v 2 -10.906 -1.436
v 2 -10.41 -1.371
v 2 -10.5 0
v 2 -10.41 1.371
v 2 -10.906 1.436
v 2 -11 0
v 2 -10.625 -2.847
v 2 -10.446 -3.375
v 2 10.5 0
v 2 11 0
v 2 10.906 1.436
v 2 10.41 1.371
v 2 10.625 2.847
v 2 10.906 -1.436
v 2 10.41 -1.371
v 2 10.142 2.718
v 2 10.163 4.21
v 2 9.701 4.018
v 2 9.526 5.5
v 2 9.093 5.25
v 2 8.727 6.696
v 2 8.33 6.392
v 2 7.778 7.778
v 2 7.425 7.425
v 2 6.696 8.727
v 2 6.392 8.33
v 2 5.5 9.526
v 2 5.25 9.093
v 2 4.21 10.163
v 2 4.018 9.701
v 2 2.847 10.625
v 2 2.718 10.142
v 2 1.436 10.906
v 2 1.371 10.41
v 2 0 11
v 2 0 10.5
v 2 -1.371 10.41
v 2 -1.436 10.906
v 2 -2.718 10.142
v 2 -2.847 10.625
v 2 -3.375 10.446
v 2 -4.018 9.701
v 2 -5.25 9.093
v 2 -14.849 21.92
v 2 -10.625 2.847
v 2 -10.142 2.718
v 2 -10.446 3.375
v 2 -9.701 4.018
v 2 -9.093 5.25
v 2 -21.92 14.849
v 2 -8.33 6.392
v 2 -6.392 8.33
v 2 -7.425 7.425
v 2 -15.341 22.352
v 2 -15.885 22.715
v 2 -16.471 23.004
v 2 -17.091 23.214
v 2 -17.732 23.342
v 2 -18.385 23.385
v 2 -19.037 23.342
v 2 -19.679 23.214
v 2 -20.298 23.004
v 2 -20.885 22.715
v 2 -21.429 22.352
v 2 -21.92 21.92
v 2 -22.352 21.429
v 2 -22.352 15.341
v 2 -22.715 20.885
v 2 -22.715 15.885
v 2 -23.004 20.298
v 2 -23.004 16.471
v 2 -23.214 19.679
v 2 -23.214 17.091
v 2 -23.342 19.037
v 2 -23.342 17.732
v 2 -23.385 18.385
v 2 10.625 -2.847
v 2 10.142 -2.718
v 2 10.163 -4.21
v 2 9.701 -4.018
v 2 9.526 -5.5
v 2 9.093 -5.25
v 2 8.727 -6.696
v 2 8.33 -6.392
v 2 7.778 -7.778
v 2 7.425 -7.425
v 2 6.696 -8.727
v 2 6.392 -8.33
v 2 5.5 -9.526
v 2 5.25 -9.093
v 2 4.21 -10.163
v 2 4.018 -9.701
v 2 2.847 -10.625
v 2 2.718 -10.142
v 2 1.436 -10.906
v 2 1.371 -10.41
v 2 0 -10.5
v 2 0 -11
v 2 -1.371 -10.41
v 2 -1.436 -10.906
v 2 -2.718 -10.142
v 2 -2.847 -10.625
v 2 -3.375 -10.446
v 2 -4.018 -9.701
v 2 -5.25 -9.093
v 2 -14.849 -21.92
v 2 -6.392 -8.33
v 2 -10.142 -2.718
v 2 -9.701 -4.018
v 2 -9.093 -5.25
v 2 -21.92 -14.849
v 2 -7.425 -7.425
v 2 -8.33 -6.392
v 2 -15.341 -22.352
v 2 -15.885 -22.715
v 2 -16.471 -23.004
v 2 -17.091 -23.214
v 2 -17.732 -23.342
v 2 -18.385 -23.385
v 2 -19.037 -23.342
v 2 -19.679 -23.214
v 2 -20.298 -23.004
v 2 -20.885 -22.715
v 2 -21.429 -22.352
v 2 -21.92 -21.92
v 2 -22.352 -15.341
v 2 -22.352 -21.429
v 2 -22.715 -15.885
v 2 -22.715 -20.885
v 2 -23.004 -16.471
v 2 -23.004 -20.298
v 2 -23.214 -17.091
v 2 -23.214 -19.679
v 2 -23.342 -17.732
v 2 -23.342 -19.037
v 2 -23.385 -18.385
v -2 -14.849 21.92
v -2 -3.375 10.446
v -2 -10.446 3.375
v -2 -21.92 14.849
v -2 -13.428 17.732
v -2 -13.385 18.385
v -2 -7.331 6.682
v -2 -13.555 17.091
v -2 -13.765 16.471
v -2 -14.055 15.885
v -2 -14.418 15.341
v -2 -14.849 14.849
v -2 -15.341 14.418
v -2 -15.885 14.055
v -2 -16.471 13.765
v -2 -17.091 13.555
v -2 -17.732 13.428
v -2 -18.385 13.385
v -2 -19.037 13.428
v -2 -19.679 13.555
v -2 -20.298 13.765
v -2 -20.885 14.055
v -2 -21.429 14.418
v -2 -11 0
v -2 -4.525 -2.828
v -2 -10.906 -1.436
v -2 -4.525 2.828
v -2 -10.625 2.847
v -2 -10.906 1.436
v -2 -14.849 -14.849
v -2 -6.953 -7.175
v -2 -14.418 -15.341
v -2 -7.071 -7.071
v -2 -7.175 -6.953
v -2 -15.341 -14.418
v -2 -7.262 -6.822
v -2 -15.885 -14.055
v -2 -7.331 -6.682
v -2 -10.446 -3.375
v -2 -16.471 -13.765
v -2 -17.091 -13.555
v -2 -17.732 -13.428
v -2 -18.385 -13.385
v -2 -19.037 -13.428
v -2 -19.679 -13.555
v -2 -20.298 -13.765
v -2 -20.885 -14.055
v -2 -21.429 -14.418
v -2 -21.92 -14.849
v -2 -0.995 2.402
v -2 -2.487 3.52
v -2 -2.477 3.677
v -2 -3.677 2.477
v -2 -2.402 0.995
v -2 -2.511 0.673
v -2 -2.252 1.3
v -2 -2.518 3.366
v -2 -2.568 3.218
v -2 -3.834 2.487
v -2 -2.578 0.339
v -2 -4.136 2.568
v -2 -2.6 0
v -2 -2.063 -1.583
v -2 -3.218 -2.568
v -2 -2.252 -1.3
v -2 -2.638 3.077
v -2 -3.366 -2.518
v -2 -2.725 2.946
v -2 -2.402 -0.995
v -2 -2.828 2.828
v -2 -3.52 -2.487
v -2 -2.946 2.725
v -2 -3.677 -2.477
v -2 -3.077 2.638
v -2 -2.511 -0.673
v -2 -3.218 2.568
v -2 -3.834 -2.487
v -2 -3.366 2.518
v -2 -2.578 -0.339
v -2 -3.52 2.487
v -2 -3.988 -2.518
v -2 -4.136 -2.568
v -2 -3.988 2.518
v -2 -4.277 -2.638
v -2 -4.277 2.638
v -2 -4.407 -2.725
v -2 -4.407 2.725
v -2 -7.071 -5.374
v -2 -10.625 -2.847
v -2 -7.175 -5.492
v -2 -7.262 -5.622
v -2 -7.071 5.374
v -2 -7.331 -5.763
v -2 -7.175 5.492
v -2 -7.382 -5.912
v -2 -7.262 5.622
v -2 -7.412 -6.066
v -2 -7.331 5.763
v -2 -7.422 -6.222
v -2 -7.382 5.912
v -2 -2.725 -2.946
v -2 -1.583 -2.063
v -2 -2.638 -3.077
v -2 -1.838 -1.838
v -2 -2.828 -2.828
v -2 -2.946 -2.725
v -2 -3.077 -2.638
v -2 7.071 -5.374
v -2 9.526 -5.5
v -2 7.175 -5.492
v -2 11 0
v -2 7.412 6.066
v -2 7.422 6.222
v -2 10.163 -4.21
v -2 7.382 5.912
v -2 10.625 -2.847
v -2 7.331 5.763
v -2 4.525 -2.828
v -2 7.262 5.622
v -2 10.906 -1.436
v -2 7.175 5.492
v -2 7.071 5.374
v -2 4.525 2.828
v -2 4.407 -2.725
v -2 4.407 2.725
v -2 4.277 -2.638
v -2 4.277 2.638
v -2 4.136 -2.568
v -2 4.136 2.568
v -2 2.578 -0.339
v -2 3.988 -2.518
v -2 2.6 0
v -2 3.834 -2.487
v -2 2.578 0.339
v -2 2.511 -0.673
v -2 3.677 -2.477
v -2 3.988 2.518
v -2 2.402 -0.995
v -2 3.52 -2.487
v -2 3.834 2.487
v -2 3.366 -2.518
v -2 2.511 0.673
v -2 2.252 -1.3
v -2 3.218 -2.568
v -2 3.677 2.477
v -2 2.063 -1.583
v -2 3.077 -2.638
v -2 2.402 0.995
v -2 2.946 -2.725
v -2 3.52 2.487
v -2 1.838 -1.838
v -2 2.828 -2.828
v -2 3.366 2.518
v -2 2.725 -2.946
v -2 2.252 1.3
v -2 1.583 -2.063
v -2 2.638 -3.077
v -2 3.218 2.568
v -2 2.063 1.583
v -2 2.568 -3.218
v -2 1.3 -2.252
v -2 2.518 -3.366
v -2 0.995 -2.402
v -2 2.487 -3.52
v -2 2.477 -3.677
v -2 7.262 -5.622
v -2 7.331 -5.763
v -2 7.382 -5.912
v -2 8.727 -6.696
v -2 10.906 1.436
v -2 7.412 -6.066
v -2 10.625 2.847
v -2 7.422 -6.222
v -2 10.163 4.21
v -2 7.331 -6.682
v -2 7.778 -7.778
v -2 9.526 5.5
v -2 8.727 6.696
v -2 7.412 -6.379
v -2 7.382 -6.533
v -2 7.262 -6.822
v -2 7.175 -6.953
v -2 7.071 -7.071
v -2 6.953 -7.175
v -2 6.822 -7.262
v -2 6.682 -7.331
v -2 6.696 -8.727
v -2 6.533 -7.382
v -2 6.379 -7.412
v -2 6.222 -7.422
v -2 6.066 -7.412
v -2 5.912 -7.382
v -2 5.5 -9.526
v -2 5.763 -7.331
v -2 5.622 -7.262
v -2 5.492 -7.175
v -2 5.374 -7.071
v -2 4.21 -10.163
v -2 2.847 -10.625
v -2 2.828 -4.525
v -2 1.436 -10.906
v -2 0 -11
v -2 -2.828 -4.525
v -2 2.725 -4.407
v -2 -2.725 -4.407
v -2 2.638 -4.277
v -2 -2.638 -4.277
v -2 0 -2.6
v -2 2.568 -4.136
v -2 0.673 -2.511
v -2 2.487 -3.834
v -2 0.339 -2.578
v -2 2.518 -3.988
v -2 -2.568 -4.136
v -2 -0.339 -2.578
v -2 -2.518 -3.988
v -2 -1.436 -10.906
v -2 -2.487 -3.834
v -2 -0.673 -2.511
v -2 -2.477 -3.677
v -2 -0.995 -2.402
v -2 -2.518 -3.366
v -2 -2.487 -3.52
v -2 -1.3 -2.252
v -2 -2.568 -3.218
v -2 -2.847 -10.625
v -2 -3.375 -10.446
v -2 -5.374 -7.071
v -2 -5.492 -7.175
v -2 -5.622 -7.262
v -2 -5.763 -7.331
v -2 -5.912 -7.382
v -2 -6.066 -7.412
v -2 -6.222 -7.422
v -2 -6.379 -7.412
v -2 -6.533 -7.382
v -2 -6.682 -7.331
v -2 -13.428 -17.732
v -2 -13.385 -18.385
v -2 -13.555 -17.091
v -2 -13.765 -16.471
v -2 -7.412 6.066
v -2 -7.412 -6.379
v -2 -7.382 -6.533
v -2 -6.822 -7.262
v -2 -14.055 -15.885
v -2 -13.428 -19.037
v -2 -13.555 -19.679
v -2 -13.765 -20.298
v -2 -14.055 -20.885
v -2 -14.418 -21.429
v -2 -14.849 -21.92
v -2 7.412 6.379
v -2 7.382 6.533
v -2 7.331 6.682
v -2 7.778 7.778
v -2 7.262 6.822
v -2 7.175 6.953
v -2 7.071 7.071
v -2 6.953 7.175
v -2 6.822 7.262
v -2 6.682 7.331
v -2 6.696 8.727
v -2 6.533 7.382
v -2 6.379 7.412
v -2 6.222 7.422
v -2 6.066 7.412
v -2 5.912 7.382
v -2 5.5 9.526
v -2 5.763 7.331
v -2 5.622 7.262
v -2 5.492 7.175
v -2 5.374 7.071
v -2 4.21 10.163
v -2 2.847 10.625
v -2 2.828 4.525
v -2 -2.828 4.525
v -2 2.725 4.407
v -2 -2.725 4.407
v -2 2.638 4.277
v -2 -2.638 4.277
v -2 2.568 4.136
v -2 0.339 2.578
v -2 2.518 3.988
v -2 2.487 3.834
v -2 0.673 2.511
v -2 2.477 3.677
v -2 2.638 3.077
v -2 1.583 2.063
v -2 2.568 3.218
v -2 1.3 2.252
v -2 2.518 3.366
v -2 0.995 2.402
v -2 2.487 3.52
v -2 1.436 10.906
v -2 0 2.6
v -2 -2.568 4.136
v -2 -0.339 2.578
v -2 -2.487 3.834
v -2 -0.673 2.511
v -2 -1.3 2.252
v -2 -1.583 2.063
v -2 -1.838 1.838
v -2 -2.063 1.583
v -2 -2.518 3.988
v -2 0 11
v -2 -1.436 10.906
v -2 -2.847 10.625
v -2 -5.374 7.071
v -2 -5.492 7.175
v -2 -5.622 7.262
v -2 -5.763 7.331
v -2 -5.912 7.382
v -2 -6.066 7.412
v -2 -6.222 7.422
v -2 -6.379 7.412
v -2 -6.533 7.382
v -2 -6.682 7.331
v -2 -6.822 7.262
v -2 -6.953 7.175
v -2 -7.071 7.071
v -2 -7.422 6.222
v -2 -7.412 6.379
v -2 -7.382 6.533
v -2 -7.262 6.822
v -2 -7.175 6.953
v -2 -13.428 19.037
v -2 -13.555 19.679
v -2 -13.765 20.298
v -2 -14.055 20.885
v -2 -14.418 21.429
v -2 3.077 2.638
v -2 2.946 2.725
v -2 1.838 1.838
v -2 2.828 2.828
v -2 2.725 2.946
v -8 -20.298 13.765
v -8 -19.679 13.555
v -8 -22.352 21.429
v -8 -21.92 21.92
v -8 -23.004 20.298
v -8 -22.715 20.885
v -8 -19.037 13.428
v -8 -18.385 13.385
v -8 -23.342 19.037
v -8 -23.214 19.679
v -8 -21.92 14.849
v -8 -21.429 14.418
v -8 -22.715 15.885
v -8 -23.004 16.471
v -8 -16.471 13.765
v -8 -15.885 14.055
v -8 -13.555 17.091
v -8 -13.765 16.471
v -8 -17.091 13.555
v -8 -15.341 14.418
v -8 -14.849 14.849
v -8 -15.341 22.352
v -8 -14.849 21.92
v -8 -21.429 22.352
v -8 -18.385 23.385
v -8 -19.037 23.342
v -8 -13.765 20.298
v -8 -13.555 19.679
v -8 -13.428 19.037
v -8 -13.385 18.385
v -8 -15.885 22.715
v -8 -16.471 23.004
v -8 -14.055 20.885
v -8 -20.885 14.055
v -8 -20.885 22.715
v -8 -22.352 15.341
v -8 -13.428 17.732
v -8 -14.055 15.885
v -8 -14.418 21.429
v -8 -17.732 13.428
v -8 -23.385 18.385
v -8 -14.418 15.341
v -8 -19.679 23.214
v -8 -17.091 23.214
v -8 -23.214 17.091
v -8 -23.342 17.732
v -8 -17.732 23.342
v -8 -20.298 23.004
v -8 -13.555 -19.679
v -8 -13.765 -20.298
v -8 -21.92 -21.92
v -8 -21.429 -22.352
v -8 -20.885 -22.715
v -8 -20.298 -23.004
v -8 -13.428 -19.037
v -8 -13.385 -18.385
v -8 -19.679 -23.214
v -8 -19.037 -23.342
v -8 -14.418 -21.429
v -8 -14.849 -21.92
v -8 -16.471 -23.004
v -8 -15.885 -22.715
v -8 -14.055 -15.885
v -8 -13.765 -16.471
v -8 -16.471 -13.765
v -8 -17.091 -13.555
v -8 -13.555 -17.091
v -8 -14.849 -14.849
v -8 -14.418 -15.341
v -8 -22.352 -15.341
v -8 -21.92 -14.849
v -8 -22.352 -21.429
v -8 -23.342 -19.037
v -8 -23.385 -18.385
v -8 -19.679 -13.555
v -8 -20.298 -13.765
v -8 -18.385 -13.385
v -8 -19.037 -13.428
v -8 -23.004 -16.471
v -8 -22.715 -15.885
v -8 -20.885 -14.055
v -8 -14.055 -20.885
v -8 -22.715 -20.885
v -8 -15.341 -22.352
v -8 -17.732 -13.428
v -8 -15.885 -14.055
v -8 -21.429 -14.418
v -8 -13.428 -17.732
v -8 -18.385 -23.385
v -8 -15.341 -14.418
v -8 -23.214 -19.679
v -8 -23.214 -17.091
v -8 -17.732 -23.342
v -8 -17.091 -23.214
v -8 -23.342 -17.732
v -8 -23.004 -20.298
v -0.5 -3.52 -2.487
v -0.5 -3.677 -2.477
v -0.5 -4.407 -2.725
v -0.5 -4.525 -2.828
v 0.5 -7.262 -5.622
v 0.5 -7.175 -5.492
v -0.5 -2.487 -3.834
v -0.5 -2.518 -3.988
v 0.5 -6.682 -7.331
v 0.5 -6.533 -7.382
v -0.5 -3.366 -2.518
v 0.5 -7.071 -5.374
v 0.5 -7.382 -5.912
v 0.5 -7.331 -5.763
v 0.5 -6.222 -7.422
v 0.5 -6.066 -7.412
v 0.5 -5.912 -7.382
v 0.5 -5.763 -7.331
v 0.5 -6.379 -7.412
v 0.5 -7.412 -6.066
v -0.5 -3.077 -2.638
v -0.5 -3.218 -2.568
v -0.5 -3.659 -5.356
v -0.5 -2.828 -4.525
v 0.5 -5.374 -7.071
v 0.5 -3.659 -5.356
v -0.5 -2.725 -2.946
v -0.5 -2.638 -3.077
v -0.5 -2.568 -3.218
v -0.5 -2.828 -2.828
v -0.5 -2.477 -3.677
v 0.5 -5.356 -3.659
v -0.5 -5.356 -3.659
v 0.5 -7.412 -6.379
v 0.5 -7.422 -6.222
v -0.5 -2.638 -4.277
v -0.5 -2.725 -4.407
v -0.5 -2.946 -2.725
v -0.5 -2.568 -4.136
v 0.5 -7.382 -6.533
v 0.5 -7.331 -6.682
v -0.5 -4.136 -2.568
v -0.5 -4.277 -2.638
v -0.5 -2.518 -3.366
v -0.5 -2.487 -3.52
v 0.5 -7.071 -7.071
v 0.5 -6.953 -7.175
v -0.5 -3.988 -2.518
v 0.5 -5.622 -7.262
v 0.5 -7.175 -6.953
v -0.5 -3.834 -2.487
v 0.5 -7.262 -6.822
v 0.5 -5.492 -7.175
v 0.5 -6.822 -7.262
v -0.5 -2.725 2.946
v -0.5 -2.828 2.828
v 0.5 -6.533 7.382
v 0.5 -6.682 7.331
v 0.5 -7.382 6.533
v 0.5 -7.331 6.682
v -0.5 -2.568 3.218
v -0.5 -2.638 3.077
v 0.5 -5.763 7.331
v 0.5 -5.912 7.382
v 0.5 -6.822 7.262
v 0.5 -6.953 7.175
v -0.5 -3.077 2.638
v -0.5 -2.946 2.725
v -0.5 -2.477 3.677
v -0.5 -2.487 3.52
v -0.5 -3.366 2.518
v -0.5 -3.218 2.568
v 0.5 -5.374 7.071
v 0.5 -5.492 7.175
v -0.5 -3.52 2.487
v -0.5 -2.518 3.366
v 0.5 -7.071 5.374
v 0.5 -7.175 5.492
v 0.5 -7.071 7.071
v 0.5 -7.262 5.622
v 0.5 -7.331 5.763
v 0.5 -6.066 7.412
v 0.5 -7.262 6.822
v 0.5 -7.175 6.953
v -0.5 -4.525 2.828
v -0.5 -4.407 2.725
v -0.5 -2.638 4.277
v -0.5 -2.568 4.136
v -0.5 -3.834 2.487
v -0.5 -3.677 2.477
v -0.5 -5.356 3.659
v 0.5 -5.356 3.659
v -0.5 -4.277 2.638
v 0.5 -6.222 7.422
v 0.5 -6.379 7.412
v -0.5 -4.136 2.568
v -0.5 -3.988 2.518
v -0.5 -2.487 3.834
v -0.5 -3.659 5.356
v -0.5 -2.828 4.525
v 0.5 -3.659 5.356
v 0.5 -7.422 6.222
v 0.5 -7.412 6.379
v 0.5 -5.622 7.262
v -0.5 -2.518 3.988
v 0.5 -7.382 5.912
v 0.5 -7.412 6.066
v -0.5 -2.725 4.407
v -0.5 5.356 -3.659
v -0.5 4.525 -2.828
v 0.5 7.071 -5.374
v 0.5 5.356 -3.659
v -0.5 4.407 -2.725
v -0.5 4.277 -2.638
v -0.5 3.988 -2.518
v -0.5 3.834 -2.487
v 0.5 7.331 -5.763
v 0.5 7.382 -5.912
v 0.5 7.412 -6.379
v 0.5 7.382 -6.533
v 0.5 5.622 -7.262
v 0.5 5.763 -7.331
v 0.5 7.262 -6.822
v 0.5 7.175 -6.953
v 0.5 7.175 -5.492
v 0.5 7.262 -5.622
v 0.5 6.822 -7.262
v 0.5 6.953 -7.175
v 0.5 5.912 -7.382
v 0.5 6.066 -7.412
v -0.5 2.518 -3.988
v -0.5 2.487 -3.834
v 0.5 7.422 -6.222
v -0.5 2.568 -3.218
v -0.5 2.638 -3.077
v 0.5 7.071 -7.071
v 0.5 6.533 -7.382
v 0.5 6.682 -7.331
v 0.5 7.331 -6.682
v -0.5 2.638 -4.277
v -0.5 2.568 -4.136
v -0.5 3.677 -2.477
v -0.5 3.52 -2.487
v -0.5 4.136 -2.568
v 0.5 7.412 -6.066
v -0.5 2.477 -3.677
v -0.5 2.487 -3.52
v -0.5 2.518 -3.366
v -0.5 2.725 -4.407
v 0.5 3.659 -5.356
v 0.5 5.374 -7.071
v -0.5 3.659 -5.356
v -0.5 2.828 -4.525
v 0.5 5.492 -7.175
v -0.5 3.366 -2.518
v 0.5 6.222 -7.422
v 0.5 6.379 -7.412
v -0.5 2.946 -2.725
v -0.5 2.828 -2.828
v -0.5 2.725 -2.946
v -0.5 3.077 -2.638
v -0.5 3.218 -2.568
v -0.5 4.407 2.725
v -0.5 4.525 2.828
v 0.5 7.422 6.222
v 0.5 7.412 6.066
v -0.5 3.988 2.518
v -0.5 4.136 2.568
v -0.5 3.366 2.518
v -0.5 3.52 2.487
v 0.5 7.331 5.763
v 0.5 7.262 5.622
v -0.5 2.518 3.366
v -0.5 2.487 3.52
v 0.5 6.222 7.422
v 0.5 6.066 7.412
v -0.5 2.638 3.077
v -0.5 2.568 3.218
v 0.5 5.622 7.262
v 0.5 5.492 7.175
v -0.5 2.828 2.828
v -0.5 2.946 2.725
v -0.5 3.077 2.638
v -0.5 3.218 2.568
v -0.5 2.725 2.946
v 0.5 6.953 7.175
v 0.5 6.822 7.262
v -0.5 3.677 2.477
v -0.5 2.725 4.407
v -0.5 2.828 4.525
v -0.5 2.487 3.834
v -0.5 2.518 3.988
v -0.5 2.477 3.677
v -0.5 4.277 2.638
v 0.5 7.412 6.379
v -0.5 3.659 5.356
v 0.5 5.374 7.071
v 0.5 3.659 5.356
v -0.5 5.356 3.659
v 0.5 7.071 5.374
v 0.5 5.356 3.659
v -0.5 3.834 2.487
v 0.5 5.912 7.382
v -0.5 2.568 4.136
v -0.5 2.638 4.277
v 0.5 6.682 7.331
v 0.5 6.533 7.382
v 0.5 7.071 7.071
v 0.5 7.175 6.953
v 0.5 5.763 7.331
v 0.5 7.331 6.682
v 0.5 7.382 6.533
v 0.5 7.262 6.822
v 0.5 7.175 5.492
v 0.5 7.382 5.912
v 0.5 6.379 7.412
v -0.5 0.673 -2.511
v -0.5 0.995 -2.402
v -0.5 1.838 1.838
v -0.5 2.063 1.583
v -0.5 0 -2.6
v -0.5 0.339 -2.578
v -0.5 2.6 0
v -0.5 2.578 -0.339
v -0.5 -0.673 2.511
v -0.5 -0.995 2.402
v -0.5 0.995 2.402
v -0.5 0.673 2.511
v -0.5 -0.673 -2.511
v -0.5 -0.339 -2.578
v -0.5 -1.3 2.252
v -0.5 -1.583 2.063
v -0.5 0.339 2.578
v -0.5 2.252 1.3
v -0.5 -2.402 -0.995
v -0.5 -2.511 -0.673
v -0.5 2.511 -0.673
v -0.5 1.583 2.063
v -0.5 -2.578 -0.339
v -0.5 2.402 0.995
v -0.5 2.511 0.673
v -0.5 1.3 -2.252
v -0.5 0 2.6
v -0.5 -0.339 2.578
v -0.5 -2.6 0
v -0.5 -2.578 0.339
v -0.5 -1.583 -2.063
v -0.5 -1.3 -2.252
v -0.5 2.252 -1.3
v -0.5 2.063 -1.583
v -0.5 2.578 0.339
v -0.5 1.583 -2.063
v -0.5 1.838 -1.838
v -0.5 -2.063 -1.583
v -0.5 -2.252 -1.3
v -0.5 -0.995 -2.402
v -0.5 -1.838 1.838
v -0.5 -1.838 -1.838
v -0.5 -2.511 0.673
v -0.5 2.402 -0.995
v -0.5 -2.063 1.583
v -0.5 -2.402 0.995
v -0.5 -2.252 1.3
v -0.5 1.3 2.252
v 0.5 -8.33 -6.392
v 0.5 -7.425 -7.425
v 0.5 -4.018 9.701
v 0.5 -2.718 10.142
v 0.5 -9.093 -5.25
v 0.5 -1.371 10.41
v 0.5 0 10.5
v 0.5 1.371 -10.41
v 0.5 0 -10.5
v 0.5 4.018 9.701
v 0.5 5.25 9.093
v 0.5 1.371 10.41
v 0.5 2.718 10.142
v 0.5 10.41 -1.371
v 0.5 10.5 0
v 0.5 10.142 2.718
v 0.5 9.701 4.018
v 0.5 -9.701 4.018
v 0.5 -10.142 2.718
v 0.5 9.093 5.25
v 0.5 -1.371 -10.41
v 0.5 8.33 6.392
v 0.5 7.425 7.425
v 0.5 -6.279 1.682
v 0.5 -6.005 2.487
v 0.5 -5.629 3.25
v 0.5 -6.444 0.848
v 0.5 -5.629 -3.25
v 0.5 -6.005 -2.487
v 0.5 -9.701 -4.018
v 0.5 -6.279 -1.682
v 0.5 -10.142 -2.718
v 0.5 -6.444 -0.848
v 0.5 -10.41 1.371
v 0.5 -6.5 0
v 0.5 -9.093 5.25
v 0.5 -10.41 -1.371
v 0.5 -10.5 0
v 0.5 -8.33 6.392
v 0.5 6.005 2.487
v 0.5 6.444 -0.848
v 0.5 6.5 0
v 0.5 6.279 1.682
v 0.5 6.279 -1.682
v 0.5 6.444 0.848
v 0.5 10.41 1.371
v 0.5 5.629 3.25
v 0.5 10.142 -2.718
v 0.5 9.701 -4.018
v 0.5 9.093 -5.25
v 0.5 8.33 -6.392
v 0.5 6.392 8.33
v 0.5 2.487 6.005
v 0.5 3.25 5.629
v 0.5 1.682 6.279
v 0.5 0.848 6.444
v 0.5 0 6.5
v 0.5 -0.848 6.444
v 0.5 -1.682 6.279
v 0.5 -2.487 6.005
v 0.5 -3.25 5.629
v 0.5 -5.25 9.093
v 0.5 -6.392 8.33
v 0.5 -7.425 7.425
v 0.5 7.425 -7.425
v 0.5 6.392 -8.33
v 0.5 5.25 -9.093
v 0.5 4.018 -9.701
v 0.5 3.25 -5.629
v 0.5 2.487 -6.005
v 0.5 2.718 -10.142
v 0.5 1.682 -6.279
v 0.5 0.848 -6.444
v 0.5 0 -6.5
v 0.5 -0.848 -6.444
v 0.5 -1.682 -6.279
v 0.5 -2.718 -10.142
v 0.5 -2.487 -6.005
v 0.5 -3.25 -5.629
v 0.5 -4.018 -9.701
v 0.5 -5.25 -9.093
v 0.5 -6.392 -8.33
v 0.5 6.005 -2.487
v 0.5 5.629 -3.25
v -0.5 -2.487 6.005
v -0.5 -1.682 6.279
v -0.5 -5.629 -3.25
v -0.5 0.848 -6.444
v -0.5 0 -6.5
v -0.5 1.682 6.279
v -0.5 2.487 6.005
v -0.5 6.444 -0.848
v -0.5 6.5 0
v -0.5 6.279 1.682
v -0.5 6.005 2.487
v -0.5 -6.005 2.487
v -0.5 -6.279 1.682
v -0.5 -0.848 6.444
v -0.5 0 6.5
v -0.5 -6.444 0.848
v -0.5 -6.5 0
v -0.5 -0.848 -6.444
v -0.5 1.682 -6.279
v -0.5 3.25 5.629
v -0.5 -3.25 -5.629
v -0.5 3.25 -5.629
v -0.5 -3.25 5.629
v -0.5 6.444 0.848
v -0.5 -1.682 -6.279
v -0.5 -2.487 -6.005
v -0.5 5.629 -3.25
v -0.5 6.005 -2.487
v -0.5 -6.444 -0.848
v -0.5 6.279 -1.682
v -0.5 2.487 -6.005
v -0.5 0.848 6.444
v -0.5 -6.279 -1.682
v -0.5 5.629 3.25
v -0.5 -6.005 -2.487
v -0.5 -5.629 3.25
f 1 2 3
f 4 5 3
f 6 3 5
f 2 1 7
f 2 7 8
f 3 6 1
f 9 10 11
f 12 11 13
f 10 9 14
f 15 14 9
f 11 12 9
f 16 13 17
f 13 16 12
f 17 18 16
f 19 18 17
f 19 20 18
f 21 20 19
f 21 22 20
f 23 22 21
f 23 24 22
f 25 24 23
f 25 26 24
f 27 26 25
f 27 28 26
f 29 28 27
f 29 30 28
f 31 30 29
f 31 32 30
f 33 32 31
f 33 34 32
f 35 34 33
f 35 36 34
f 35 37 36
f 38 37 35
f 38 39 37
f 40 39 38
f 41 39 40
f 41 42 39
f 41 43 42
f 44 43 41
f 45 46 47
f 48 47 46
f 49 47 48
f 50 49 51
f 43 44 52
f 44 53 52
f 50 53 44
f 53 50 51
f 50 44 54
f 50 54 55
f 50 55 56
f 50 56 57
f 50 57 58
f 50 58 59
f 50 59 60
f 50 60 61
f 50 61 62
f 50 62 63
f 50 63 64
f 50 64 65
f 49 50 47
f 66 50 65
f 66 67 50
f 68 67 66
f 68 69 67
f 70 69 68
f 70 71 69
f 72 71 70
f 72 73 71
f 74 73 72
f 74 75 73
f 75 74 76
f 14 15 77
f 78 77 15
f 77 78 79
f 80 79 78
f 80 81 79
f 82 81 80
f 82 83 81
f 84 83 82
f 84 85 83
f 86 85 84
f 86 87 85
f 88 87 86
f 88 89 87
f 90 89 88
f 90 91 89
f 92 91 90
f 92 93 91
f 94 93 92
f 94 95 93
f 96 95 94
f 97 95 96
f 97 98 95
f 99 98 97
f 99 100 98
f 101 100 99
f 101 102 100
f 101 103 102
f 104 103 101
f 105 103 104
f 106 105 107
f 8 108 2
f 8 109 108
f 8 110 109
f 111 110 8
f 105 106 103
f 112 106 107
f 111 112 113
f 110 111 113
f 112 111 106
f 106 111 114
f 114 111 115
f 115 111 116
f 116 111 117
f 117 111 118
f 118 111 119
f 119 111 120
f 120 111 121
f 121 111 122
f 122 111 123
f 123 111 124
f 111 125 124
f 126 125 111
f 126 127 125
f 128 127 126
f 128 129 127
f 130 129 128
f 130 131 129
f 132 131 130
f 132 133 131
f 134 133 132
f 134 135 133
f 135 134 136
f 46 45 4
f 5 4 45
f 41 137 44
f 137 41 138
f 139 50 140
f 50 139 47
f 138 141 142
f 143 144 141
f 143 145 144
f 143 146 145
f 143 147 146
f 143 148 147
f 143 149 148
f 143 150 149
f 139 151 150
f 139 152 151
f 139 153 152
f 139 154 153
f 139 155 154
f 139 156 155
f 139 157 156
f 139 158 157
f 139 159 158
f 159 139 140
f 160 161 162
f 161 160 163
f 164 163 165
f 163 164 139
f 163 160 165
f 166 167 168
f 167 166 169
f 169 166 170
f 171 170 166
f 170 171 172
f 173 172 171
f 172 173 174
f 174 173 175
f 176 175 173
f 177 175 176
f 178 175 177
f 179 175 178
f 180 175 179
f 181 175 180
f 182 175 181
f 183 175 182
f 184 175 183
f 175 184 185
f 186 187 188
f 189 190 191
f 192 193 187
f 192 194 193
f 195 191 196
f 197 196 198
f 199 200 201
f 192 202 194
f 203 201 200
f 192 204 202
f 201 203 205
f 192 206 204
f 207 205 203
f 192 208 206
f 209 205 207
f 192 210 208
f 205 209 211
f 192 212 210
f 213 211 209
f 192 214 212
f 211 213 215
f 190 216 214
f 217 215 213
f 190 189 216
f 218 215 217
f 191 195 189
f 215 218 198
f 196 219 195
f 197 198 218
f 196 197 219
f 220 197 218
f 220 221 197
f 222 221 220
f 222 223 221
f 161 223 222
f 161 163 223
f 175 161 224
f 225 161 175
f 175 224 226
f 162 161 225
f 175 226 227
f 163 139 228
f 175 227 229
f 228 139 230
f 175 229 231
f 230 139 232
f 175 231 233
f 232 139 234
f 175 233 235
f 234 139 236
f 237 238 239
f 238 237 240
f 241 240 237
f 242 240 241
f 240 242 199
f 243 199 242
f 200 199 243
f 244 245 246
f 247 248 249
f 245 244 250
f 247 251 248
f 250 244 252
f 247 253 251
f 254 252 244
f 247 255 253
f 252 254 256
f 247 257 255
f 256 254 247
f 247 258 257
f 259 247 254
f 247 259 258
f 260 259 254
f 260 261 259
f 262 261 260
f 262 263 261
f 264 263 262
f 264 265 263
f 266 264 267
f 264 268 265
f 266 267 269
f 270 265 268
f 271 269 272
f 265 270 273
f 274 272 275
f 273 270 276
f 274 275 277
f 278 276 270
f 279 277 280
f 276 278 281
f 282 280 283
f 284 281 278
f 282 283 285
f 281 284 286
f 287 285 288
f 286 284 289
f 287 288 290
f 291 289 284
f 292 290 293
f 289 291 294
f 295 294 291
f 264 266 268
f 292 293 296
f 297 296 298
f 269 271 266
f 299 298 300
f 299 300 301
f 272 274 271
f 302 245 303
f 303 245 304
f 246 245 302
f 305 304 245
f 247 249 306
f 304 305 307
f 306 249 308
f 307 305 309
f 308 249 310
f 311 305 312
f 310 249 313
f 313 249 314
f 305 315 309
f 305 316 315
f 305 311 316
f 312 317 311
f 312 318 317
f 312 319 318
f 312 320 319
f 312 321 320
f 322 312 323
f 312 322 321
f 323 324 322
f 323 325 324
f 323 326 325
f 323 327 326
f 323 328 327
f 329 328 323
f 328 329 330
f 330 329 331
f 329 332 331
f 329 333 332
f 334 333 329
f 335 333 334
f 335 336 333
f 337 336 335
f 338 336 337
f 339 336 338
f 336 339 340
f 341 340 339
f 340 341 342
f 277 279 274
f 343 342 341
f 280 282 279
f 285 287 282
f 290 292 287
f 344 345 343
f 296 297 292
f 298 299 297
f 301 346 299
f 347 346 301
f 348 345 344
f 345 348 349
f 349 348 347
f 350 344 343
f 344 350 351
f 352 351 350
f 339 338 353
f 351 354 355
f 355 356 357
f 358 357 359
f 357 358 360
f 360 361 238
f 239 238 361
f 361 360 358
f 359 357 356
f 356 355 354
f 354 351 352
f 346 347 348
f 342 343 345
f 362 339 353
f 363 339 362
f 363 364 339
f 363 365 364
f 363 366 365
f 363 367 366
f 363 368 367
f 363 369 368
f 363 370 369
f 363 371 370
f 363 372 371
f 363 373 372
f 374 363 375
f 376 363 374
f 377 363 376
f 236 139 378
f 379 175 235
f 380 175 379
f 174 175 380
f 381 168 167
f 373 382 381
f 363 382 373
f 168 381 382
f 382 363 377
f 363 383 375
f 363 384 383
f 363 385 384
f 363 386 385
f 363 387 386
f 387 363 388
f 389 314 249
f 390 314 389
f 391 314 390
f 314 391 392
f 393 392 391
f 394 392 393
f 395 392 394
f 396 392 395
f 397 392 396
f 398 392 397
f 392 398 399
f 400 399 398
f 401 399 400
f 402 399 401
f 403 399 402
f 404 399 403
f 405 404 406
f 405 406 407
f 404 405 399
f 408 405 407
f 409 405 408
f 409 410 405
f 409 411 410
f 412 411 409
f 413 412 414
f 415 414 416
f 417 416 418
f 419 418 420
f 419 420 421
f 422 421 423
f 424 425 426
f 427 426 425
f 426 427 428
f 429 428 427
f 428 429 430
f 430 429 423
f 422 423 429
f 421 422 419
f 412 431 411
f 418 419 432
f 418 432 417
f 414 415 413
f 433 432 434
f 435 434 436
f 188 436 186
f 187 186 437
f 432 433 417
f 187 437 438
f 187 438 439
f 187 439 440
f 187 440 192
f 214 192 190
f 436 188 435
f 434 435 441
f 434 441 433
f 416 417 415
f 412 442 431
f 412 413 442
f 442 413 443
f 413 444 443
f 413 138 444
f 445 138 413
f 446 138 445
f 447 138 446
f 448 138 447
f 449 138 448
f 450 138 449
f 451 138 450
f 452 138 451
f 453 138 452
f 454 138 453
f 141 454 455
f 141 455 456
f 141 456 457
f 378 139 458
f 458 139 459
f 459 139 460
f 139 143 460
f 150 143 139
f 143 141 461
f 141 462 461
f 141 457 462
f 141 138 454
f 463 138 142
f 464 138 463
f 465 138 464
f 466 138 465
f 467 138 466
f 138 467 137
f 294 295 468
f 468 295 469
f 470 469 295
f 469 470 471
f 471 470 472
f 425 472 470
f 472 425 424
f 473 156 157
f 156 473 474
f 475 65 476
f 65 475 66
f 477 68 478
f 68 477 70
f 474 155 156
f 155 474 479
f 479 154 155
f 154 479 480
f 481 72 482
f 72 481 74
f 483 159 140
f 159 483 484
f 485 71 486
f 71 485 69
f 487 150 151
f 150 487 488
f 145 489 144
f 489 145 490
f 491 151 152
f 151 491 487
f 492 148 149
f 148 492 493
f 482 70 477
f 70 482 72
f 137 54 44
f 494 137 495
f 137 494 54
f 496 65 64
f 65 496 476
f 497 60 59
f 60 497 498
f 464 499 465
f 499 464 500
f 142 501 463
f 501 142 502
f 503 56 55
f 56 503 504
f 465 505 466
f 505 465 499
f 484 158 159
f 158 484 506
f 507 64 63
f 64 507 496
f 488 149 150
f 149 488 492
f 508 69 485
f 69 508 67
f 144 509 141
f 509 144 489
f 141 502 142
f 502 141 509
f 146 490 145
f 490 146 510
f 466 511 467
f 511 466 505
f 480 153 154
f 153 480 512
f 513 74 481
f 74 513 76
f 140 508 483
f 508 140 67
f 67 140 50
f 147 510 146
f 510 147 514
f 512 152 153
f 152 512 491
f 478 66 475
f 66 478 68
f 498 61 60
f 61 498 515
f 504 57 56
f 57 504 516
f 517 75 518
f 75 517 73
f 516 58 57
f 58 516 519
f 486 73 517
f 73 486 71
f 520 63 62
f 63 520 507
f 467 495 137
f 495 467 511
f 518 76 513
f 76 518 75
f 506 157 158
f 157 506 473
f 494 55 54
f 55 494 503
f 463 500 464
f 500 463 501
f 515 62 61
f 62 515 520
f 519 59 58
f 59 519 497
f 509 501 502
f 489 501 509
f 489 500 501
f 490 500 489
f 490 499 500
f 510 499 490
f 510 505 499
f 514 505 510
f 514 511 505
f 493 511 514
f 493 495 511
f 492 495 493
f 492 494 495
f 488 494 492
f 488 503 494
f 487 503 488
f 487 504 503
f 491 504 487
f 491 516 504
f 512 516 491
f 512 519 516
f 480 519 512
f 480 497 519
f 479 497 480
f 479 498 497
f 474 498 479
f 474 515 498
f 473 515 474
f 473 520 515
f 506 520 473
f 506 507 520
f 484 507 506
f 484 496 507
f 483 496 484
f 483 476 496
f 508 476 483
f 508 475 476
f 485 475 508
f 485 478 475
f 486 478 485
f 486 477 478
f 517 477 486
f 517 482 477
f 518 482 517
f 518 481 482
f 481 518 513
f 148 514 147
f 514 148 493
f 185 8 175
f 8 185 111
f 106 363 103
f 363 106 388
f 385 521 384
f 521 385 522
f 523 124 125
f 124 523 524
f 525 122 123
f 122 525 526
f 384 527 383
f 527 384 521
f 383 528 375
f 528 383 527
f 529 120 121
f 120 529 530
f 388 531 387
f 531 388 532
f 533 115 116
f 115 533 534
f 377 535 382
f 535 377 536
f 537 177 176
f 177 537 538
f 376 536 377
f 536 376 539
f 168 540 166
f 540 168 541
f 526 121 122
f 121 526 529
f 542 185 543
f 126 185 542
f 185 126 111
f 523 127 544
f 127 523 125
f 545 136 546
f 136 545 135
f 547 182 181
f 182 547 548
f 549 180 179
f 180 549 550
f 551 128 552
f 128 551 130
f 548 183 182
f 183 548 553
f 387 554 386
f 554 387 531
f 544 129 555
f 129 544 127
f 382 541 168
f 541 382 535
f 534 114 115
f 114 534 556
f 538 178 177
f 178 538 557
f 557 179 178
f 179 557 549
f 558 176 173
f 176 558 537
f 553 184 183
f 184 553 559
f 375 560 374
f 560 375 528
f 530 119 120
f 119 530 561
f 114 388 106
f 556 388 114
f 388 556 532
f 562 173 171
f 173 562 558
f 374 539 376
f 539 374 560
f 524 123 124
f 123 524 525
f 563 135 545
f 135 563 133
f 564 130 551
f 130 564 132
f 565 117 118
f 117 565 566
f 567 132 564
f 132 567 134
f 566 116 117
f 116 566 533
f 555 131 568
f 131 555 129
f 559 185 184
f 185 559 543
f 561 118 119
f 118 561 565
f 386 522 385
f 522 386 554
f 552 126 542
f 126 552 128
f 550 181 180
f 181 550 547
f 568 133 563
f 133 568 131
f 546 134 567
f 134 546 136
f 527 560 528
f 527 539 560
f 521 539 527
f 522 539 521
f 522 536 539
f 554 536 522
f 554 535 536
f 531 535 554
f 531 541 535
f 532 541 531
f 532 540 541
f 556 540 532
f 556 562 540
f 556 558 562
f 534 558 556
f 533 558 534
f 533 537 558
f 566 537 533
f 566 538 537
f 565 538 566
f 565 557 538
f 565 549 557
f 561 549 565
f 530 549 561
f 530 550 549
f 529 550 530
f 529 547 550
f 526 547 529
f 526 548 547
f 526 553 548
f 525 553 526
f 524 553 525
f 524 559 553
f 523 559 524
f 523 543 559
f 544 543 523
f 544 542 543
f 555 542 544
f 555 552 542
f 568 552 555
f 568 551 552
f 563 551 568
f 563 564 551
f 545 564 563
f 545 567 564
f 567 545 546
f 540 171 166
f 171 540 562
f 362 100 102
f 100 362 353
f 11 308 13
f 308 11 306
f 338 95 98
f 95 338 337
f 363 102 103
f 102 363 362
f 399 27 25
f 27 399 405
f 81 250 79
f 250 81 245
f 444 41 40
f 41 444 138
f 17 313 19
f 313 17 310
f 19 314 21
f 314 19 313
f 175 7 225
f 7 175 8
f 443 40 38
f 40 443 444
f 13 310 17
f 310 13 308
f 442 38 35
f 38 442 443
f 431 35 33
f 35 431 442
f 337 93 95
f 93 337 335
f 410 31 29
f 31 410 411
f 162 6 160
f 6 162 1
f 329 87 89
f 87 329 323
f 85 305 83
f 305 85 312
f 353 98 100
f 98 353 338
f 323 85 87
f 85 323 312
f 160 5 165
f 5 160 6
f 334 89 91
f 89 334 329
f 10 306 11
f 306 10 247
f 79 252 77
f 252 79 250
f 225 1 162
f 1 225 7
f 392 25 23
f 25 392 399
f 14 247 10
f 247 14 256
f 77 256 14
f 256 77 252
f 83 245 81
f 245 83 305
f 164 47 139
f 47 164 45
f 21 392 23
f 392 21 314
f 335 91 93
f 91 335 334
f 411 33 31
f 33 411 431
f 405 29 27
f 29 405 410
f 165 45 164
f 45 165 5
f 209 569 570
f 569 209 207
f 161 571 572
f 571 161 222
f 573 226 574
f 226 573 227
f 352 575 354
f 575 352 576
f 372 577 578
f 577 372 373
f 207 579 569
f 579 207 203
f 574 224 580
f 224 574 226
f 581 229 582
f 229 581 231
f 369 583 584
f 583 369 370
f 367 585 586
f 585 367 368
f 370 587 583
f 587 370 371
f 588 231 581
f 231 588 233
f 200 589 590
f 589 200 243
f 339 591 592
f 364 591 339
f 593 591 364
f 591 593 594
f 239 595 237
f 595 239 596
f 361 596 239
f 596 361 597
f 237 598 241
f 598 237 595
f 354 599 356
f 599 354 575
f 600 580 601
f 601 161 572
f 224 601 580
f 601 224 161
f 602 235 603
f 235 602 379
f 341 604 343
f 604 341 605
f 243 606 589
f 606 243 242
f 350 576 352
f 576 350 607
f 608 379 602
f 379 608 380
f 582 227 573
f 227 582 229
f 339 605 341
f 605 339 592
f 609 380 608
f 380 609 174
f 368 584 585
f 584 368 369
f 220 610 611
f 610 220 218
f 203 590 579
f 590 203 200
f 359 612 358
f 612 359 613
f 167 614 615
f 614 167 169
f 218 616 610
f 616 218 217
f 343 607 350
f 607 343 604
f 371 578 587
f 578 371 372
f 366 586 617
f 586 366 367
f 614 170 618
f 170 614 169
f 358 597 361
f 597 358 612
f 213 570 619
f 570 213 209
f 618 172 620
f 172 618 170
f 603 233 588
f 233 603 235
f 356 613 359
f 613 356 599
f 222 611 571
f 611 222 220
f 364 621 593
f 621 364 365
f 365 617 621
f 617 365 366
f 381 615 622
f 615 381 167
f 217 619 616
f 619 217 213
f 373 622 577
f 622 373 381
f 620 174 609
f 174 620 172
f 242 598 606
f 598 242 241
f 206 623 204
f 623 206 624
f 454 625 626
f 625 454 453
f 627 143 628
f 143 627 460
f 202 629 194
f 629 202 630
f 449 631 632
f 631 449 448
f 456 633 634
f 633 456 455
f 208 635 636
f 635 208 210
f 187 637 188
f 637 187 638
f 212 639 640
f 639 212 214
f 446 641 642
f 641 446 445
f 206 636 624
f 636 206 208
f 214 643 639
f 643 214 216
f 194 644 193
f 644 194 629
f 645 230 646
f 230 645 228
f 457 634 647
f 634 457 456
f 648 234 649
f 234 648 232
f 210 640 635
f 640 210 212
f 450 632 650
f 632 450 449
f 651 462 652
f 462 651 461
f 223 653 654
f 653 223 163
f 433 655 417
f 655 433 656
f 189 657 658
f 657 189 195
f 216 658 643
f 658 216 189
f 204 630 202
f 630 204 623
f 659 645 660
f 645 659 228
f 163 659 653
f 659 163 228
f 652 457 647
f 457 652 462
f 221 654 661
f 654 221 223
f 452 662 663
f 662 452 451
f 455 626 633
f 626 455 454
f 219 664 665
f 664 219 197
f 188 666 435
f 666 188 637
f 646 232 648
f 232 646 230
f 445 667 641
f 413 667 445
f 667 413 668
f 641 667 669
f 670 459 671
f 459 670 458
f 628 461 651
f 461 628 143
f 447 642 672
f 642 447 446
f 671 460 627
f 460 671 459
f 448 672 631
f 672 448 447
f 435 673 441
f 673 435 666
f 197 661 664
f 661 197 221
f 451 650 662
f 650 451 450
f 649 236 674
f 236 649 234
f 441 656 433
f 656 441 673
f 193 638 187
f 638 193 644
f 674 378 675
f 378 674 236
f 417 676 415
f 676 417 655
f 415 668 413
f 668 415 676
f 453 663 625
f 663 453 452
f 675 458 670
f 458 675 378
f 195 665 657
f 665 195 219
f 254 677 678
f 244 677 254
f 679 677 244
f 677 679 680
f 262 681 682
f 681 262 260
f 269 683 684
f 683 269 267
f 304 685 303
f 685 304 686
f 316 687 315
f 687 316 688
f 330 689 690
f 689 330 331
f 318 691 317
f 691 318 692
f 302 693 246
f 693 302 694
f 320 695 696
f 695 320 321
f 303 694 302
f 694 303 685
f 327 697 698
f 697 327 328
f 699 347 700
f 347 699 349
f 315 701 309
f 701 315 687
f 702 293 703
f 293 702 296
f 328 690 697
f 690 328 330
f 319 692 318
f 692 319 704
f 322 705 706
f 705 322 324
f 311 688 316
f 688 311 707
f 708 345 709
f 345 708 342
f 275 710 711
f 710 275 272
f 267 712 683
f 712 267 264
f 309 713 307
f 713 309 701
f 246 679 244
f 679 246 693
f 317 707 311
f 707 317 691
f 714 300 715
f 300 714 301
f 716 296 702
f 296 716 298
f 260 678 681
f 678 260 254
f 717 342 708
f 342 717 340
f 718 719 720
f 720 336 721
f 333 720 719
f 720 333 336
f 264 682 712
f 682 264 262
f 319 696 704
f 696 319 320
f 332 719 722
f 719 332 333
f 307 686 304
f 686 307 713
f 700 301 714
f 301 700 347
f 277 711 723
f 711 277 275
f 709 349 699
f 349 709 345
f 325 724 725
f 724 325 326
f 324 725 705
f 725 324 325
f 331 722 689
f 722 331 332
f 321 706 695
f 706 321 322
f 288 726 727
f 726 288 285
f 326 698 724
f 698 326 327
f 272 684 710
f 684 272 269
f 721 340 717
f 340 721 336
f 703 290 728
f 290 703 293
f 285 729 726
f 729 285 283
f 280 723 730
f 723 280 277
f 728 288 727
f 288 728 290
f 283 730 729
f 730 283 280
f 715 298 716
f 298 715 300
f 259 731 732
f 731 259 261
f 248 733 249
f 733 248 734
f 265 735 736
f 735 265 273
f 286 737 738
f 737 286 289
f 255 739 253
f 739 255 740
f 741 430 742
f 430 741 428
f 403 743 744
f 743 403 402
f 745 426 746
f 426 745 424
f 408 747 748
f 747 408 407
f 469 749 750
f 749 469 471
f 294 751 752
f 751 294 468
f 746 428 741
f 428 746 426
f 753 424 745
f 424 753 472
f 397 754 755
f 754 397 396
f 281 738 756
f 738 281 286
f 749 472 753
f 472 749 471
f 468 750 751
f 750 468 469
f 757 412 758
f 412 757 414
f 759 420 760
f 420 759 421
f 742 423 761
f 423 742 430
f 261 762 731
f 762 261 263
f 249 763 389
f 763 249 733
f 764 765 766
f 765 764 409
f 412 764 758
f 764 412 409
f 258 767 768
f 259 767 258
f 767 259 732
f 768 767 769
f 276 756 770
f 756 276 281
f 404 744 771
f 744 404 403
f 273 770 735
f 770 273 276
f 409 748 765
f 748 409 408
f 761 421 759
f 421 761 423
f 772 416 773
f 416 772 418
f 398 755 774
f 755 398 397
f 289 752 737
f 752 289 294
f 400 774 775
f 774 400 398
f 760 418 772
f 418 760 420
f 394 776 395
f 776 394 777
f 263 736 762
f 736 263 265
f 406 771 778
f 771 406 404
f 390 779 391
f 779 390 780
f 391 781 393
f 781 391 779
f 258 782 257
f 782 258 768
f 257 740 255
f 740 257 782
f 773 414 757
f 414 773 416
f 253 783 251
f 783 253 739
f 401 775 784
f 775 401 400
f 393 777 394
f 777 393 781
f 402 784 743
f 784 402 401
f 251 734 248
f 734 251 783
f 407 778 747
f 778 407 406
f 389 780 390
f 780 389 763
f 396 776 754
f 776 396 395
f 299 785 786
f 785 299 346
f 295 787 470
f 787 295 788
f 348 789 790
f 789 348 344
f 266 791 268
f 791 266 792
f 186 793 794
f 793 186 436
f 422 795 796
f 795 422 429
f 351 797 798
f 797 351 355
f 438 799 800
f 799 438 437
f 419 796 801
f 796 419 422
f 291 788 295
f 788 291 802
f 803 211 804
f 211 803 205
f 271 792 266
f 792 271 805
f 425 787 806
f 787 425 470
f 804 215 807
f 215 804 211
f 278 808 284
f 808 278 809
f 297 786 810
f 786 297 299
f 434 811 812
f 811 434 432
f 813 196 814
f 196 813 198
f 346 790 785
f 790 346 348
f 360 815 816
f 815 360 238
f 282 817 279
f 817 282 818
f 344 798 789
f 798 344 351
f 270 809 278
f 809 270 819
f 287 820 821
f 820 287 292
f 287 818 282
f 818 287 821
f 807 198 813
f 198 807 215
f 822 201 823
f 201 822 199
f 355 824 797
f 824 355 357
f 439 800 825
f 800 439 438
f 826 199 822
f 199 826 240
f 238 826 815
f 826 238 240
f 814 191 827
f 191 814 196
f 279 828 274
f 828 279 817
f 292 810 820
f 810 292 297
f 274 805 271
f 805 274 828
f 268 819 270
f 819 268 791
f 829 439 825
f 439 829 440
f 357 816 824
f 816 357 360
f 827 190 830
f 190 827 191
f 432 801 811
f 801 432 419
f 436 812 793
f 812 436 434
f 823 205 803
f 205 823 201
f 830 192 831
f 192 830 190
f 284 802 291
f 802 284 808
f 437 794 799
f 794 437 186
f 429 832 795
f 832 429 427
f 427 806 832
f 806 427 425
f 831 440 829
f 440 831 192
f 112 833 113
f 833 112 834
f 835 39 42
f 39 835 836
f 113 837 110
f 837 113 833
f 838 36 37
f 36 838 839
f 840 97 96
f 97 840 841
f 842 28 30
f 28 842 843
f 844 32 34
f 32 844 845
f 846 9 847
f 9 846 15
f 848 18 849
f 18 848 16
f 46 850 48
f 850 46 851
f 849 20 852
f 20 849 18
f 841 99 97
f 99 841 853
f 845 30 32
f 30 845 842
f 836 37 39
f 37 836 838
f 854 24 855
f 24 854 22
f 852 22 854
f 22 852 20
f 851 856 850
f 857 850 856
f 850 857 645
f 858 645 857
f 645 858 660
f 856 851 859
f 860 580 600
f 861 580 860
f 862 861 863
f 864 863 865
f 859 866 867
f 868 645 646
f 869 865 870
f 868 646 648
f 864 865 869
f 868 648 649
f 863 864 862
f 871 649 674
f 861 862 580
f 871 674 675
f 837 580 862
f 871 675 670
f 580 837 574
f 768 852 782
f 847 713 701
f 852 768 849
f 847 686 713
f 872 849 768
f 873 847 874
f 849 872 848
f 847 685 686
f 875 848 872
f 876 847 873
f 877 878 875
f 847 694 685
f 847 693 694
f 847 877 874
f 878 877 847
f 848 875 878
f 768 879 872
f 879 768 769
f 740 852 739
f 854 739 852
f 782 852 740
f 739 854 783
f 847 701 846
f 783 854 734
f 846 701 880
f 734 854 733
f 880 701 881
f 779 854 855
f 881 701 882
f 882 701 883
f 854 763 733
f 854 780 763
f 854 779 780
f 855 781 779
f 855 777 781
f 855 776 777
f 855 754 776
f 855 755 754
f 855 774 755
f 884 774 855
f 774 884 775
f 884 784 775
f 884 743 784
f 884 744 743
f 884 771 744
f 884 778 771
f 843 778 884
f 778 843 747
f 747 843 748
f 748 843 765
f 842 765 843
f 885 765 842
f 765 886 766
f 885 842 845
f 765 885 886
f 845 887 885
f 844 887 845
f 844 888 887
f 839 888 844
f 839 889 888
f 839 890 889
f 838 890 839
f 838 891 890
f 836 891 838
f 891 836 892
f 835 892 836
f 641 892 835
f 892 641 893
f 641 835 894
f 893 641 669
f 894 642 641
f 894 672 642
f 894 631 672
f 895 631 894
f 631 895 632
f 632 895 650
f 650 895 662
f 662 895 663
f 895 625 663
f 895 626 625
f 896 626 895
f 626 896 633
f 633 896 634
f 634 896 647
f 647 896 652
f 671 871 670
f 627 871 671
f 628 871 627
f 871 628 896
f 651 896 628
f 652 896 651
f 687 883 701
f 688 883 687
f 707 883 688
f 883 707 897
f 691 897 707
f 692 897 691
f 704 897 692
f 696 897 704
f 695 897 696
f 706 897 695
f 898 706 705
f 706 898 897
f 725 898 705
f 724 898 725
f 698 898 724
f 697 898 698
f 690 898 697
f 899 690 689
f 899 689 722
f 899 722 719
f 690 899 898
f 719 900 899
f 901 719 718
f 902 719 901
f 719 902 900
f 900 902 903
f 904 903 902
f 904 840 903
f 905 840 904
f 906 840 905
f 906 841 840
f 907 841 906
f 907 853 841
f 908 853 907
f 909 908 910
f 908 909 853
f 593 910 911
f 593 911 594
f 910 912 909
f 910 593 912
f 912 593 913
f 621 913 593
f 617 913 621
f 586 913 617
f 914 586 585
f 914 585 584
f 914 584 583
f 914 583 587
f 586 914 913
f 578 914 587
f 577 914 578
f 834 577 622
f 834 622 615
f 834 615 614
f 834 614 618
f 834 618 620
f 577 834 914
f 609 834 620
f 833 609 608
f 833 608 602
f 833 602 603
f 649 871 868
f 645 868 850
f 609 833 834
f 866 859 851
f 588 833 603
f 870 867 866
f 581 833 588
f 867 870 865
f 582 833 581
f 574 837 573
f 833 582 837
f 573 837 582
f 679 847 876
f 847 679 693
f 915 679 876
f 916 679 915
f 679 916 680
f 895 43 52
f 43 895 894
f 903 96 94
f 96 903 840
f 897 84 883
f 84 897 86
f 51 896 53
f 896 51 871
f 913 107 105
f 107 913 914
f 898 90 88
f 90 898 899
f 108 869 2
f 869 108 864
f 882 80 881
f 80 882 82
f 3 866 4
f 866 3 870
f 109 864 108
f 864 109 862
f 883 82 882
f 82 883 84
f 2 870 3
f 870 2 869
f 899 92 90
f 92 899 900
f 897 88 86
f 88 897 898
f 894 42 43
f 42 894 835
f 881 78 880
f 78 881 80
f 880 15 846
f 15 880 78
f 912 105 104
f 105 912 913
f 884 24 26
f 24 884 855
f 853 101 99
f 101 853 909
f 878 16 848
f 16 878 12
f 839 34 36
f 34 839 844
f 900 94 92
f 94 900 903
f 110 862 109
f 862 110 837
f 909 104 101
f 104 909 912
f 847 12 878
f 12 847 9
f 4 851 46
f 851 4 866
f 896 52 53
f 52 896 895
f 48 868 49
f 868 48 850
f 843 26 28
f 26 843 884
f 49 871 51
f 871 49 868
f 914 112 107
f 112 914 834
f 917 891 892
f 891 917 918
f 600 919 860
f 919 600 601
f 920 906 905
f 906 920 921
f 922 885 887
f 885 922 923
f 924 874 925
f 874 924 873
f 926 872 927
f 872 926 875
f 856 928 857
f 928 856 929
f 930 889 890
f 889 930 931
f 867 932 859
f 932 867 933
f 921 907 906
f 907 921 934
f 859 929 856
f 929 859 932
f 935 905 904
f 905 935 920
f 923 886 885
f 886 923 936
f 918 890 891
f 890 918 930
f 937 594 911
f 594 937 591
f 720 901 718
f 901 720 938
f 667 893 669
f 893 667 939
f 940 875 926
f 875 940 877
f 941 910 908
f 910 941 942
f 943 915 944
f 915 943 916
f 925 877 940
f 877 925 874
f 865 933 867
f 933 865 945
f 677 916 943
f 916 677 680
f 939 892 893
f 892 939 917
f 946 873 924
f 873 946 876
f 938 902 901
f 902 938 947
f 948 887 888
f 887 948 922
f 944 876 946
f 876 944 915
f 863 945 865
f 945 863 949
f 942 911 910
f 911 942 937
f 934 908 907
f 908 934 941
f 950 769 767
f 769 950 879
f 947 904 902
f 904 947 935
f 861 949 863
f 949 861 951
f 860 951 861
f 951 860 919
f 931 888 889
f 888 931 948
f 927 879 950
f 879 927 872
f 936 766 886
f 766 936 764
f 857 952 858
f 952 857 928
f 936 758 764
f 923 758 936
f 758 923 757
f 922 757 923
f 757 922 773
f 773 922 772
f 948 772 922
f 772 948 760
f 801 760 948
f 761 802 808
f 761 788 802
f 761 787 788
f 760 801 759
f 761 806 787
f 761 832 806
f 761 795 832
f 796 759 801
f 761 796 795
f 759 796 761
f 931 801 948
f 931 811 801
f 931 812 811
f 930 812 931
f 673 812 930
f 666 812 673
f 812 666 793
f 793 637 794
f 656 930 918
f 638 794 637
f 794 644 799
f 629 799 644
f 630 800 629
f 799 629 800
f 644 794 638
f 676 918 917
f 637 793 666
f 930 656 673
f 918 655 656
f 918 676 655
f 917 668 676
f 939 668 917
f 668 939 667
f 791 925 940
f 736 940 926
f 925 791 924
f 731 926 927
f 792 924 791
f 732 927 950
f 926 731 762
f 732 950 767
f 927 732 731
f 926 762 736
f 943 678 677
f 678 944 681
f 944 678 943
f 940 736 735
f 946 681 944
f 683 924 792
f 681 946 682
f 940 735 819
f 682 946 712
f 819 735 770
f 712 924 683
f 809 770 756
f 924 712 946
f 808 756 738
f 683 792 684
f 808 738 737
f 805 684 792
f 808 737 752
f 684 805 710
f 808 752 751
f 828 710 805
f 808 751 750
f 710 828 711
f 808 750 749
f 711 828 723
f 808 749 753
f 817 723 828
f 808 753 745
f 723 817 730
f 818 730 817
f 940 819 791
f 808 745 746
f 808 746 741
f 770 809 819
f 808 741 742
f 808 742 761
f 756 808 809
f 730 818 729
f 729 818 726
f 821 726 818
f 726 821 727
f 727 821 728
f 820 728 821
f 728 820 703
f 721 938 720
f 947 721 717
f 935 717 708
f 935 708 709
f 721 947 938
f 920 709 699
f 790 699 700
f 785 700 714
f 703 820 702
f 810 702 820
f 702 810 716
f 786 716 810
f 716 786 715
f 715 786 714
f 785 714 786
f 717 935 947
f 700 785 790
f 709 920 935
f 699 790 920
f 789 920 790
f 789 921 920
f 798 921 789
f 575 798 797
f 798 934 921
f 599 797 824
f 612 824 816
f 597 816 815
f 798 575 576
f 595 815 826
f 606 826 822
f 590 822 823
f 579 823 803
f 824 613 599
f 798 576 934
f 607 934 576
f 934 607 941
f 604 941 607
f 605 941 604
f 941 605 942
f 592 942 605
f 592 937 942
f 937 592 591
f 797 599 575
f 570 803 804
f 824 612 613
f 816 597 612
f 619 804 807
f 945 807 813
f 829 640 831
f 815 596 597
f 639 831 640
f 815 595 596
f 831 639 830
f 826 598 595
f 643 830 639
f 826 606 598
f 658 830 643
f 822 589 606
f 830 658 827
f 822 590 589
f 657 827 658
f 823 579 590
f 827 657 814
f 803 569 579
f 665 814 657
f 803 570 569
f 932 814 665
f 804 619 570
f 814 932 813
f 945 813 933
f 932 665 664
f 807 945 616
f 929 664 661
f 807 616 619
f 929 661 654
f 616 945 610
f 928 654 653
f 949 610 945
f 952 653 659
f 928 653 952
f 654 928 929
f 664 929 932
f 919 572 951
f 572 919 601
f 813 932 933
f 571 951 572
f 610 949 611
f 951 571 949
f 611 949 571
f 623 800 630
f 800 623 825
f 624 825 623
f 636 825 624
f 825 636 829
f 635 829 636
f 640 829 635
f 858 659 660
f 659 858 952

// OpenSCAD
// Two-spoke pusher arm for the light-switch pusher, design v1
// (Issue #18, revised by Issue #24). The target rocker is a seesaw
// (docs/LIGHT_SWITCH.md), so one arm must press the upper and lower
// halves alternately.
//
// Frame: origin at the shaft centre, X along the shaft axis (+X
// toward the servo body), Y out from the wall, Z up. At rest the two
// spokes point at +/- spoke_angle from the wall-pointing (-Y)
// direction. A press swings a spoke about 11-15 degrees toward the
// wall-pointing direction (bench-tuned, U6): the disc pad meets the
// rocker half at about Z = +/-15..17 and drives it about 1.6 mm.
// Pads are discs at pad_radius - a disc has no corners, so its reach
// toward the wall is the same at every swing angle.
//
// Fixing: the centre screw through the shaft hole is the primary
// fixing, as with stock horns. The servo-side face of the hub has a
// stepped recess (disc-horn pocket r = 10.5, boss recess r = 6.5) so
// the horn and shaft boss seat inside the hub outline, and four
// diagonal slots (radius 5.2..8.8) take horn screws where the horn
// provides them. The pads are flush with the servo-side (+X) face,
// so the arm prints flat on its -X face without supports.
//
// Render status: verified with OpenSCAD 2021.01 (Issues #18, #24).

$fn = 48;

// ---- Parameters ----
spoke_angle = 45;      // rest angle of each spoke from -Y, degrees
pad_radius = 26;       // shaft centre to pad centre
spoke_w = 10;          // spoke width (tangential)
arm_t = 4;             // arm thickness (X)
hub_r = 11;            // hub disc radius
pad_r = 5;             // pad disc radius
pad_x = 10;            // pad width (X), flush with the +X face

// One spoke with its pad, at rest angle a (degrees, + = upper).
module spoke(a) {
  rotate([-a, 0, 0]) {
    // Bar from radius 4 to radius 26 (tip inside the pad disc).
    translate([0, -15, 0]) cube([arm_t, 22, spoke_w], center = true);
    // Disc pad at pad_radius: spans X = -8..+2, flush with the
    // hub's +X (servo-side) face, protruding toward the rocker.
    translate([-3, -pad_radius, 0])
      rotate([0, 90, 0]) cylinder(h = pad_x, r = pad_r, center = true);
  }
}

module arm() {
  difference() {
    union() {
      // Hub disc (X from -arm_t/2 to +arm_t/2).
      rotate([0, 90, 0]) cylinder(h = arm_t, r = hub_r, center = true);
      spoke(spoke_angle);
      spoke(-spoke_angle);
    }
    // Centre hole for the horn screw.
    rotate([0, 90, 0]) cylinder(h = arm_t + 4, r = 2.6, center = true);
    // Stepped recess on the +X (servo) face: disc-horn pocket
    // (floor at X = +0.5, depth 1.5).
    translate([1.5, 0, 0]) rotate([0, 90, 0])
      cylinder(h = 2, r = 10.5, center = true);
    // Boss recess (floor at X = -0.5, depth 2.5; 1.5 mm of hub
    // remains on the rocker side).
    translate([0.75, 0, 0]) rotate([0, 90, 0])
      cylinder(h = 2.5, r = 6.5, center = true);
    // Four diagonal horn-screw slots (radius 5.2..8.8).
    for (sy = [-1, 1], sz = [-1, 1])
      hull() {
        for (rr = [5.2, 8.8])
          translate([0, sy * rr * 0.7071, sz * rr * 0.7071])
            rotate([0, 90, 0]) cylinder(h = arm_t + 4, r = 1.2, center = true);
      }
  }
}

arm();
